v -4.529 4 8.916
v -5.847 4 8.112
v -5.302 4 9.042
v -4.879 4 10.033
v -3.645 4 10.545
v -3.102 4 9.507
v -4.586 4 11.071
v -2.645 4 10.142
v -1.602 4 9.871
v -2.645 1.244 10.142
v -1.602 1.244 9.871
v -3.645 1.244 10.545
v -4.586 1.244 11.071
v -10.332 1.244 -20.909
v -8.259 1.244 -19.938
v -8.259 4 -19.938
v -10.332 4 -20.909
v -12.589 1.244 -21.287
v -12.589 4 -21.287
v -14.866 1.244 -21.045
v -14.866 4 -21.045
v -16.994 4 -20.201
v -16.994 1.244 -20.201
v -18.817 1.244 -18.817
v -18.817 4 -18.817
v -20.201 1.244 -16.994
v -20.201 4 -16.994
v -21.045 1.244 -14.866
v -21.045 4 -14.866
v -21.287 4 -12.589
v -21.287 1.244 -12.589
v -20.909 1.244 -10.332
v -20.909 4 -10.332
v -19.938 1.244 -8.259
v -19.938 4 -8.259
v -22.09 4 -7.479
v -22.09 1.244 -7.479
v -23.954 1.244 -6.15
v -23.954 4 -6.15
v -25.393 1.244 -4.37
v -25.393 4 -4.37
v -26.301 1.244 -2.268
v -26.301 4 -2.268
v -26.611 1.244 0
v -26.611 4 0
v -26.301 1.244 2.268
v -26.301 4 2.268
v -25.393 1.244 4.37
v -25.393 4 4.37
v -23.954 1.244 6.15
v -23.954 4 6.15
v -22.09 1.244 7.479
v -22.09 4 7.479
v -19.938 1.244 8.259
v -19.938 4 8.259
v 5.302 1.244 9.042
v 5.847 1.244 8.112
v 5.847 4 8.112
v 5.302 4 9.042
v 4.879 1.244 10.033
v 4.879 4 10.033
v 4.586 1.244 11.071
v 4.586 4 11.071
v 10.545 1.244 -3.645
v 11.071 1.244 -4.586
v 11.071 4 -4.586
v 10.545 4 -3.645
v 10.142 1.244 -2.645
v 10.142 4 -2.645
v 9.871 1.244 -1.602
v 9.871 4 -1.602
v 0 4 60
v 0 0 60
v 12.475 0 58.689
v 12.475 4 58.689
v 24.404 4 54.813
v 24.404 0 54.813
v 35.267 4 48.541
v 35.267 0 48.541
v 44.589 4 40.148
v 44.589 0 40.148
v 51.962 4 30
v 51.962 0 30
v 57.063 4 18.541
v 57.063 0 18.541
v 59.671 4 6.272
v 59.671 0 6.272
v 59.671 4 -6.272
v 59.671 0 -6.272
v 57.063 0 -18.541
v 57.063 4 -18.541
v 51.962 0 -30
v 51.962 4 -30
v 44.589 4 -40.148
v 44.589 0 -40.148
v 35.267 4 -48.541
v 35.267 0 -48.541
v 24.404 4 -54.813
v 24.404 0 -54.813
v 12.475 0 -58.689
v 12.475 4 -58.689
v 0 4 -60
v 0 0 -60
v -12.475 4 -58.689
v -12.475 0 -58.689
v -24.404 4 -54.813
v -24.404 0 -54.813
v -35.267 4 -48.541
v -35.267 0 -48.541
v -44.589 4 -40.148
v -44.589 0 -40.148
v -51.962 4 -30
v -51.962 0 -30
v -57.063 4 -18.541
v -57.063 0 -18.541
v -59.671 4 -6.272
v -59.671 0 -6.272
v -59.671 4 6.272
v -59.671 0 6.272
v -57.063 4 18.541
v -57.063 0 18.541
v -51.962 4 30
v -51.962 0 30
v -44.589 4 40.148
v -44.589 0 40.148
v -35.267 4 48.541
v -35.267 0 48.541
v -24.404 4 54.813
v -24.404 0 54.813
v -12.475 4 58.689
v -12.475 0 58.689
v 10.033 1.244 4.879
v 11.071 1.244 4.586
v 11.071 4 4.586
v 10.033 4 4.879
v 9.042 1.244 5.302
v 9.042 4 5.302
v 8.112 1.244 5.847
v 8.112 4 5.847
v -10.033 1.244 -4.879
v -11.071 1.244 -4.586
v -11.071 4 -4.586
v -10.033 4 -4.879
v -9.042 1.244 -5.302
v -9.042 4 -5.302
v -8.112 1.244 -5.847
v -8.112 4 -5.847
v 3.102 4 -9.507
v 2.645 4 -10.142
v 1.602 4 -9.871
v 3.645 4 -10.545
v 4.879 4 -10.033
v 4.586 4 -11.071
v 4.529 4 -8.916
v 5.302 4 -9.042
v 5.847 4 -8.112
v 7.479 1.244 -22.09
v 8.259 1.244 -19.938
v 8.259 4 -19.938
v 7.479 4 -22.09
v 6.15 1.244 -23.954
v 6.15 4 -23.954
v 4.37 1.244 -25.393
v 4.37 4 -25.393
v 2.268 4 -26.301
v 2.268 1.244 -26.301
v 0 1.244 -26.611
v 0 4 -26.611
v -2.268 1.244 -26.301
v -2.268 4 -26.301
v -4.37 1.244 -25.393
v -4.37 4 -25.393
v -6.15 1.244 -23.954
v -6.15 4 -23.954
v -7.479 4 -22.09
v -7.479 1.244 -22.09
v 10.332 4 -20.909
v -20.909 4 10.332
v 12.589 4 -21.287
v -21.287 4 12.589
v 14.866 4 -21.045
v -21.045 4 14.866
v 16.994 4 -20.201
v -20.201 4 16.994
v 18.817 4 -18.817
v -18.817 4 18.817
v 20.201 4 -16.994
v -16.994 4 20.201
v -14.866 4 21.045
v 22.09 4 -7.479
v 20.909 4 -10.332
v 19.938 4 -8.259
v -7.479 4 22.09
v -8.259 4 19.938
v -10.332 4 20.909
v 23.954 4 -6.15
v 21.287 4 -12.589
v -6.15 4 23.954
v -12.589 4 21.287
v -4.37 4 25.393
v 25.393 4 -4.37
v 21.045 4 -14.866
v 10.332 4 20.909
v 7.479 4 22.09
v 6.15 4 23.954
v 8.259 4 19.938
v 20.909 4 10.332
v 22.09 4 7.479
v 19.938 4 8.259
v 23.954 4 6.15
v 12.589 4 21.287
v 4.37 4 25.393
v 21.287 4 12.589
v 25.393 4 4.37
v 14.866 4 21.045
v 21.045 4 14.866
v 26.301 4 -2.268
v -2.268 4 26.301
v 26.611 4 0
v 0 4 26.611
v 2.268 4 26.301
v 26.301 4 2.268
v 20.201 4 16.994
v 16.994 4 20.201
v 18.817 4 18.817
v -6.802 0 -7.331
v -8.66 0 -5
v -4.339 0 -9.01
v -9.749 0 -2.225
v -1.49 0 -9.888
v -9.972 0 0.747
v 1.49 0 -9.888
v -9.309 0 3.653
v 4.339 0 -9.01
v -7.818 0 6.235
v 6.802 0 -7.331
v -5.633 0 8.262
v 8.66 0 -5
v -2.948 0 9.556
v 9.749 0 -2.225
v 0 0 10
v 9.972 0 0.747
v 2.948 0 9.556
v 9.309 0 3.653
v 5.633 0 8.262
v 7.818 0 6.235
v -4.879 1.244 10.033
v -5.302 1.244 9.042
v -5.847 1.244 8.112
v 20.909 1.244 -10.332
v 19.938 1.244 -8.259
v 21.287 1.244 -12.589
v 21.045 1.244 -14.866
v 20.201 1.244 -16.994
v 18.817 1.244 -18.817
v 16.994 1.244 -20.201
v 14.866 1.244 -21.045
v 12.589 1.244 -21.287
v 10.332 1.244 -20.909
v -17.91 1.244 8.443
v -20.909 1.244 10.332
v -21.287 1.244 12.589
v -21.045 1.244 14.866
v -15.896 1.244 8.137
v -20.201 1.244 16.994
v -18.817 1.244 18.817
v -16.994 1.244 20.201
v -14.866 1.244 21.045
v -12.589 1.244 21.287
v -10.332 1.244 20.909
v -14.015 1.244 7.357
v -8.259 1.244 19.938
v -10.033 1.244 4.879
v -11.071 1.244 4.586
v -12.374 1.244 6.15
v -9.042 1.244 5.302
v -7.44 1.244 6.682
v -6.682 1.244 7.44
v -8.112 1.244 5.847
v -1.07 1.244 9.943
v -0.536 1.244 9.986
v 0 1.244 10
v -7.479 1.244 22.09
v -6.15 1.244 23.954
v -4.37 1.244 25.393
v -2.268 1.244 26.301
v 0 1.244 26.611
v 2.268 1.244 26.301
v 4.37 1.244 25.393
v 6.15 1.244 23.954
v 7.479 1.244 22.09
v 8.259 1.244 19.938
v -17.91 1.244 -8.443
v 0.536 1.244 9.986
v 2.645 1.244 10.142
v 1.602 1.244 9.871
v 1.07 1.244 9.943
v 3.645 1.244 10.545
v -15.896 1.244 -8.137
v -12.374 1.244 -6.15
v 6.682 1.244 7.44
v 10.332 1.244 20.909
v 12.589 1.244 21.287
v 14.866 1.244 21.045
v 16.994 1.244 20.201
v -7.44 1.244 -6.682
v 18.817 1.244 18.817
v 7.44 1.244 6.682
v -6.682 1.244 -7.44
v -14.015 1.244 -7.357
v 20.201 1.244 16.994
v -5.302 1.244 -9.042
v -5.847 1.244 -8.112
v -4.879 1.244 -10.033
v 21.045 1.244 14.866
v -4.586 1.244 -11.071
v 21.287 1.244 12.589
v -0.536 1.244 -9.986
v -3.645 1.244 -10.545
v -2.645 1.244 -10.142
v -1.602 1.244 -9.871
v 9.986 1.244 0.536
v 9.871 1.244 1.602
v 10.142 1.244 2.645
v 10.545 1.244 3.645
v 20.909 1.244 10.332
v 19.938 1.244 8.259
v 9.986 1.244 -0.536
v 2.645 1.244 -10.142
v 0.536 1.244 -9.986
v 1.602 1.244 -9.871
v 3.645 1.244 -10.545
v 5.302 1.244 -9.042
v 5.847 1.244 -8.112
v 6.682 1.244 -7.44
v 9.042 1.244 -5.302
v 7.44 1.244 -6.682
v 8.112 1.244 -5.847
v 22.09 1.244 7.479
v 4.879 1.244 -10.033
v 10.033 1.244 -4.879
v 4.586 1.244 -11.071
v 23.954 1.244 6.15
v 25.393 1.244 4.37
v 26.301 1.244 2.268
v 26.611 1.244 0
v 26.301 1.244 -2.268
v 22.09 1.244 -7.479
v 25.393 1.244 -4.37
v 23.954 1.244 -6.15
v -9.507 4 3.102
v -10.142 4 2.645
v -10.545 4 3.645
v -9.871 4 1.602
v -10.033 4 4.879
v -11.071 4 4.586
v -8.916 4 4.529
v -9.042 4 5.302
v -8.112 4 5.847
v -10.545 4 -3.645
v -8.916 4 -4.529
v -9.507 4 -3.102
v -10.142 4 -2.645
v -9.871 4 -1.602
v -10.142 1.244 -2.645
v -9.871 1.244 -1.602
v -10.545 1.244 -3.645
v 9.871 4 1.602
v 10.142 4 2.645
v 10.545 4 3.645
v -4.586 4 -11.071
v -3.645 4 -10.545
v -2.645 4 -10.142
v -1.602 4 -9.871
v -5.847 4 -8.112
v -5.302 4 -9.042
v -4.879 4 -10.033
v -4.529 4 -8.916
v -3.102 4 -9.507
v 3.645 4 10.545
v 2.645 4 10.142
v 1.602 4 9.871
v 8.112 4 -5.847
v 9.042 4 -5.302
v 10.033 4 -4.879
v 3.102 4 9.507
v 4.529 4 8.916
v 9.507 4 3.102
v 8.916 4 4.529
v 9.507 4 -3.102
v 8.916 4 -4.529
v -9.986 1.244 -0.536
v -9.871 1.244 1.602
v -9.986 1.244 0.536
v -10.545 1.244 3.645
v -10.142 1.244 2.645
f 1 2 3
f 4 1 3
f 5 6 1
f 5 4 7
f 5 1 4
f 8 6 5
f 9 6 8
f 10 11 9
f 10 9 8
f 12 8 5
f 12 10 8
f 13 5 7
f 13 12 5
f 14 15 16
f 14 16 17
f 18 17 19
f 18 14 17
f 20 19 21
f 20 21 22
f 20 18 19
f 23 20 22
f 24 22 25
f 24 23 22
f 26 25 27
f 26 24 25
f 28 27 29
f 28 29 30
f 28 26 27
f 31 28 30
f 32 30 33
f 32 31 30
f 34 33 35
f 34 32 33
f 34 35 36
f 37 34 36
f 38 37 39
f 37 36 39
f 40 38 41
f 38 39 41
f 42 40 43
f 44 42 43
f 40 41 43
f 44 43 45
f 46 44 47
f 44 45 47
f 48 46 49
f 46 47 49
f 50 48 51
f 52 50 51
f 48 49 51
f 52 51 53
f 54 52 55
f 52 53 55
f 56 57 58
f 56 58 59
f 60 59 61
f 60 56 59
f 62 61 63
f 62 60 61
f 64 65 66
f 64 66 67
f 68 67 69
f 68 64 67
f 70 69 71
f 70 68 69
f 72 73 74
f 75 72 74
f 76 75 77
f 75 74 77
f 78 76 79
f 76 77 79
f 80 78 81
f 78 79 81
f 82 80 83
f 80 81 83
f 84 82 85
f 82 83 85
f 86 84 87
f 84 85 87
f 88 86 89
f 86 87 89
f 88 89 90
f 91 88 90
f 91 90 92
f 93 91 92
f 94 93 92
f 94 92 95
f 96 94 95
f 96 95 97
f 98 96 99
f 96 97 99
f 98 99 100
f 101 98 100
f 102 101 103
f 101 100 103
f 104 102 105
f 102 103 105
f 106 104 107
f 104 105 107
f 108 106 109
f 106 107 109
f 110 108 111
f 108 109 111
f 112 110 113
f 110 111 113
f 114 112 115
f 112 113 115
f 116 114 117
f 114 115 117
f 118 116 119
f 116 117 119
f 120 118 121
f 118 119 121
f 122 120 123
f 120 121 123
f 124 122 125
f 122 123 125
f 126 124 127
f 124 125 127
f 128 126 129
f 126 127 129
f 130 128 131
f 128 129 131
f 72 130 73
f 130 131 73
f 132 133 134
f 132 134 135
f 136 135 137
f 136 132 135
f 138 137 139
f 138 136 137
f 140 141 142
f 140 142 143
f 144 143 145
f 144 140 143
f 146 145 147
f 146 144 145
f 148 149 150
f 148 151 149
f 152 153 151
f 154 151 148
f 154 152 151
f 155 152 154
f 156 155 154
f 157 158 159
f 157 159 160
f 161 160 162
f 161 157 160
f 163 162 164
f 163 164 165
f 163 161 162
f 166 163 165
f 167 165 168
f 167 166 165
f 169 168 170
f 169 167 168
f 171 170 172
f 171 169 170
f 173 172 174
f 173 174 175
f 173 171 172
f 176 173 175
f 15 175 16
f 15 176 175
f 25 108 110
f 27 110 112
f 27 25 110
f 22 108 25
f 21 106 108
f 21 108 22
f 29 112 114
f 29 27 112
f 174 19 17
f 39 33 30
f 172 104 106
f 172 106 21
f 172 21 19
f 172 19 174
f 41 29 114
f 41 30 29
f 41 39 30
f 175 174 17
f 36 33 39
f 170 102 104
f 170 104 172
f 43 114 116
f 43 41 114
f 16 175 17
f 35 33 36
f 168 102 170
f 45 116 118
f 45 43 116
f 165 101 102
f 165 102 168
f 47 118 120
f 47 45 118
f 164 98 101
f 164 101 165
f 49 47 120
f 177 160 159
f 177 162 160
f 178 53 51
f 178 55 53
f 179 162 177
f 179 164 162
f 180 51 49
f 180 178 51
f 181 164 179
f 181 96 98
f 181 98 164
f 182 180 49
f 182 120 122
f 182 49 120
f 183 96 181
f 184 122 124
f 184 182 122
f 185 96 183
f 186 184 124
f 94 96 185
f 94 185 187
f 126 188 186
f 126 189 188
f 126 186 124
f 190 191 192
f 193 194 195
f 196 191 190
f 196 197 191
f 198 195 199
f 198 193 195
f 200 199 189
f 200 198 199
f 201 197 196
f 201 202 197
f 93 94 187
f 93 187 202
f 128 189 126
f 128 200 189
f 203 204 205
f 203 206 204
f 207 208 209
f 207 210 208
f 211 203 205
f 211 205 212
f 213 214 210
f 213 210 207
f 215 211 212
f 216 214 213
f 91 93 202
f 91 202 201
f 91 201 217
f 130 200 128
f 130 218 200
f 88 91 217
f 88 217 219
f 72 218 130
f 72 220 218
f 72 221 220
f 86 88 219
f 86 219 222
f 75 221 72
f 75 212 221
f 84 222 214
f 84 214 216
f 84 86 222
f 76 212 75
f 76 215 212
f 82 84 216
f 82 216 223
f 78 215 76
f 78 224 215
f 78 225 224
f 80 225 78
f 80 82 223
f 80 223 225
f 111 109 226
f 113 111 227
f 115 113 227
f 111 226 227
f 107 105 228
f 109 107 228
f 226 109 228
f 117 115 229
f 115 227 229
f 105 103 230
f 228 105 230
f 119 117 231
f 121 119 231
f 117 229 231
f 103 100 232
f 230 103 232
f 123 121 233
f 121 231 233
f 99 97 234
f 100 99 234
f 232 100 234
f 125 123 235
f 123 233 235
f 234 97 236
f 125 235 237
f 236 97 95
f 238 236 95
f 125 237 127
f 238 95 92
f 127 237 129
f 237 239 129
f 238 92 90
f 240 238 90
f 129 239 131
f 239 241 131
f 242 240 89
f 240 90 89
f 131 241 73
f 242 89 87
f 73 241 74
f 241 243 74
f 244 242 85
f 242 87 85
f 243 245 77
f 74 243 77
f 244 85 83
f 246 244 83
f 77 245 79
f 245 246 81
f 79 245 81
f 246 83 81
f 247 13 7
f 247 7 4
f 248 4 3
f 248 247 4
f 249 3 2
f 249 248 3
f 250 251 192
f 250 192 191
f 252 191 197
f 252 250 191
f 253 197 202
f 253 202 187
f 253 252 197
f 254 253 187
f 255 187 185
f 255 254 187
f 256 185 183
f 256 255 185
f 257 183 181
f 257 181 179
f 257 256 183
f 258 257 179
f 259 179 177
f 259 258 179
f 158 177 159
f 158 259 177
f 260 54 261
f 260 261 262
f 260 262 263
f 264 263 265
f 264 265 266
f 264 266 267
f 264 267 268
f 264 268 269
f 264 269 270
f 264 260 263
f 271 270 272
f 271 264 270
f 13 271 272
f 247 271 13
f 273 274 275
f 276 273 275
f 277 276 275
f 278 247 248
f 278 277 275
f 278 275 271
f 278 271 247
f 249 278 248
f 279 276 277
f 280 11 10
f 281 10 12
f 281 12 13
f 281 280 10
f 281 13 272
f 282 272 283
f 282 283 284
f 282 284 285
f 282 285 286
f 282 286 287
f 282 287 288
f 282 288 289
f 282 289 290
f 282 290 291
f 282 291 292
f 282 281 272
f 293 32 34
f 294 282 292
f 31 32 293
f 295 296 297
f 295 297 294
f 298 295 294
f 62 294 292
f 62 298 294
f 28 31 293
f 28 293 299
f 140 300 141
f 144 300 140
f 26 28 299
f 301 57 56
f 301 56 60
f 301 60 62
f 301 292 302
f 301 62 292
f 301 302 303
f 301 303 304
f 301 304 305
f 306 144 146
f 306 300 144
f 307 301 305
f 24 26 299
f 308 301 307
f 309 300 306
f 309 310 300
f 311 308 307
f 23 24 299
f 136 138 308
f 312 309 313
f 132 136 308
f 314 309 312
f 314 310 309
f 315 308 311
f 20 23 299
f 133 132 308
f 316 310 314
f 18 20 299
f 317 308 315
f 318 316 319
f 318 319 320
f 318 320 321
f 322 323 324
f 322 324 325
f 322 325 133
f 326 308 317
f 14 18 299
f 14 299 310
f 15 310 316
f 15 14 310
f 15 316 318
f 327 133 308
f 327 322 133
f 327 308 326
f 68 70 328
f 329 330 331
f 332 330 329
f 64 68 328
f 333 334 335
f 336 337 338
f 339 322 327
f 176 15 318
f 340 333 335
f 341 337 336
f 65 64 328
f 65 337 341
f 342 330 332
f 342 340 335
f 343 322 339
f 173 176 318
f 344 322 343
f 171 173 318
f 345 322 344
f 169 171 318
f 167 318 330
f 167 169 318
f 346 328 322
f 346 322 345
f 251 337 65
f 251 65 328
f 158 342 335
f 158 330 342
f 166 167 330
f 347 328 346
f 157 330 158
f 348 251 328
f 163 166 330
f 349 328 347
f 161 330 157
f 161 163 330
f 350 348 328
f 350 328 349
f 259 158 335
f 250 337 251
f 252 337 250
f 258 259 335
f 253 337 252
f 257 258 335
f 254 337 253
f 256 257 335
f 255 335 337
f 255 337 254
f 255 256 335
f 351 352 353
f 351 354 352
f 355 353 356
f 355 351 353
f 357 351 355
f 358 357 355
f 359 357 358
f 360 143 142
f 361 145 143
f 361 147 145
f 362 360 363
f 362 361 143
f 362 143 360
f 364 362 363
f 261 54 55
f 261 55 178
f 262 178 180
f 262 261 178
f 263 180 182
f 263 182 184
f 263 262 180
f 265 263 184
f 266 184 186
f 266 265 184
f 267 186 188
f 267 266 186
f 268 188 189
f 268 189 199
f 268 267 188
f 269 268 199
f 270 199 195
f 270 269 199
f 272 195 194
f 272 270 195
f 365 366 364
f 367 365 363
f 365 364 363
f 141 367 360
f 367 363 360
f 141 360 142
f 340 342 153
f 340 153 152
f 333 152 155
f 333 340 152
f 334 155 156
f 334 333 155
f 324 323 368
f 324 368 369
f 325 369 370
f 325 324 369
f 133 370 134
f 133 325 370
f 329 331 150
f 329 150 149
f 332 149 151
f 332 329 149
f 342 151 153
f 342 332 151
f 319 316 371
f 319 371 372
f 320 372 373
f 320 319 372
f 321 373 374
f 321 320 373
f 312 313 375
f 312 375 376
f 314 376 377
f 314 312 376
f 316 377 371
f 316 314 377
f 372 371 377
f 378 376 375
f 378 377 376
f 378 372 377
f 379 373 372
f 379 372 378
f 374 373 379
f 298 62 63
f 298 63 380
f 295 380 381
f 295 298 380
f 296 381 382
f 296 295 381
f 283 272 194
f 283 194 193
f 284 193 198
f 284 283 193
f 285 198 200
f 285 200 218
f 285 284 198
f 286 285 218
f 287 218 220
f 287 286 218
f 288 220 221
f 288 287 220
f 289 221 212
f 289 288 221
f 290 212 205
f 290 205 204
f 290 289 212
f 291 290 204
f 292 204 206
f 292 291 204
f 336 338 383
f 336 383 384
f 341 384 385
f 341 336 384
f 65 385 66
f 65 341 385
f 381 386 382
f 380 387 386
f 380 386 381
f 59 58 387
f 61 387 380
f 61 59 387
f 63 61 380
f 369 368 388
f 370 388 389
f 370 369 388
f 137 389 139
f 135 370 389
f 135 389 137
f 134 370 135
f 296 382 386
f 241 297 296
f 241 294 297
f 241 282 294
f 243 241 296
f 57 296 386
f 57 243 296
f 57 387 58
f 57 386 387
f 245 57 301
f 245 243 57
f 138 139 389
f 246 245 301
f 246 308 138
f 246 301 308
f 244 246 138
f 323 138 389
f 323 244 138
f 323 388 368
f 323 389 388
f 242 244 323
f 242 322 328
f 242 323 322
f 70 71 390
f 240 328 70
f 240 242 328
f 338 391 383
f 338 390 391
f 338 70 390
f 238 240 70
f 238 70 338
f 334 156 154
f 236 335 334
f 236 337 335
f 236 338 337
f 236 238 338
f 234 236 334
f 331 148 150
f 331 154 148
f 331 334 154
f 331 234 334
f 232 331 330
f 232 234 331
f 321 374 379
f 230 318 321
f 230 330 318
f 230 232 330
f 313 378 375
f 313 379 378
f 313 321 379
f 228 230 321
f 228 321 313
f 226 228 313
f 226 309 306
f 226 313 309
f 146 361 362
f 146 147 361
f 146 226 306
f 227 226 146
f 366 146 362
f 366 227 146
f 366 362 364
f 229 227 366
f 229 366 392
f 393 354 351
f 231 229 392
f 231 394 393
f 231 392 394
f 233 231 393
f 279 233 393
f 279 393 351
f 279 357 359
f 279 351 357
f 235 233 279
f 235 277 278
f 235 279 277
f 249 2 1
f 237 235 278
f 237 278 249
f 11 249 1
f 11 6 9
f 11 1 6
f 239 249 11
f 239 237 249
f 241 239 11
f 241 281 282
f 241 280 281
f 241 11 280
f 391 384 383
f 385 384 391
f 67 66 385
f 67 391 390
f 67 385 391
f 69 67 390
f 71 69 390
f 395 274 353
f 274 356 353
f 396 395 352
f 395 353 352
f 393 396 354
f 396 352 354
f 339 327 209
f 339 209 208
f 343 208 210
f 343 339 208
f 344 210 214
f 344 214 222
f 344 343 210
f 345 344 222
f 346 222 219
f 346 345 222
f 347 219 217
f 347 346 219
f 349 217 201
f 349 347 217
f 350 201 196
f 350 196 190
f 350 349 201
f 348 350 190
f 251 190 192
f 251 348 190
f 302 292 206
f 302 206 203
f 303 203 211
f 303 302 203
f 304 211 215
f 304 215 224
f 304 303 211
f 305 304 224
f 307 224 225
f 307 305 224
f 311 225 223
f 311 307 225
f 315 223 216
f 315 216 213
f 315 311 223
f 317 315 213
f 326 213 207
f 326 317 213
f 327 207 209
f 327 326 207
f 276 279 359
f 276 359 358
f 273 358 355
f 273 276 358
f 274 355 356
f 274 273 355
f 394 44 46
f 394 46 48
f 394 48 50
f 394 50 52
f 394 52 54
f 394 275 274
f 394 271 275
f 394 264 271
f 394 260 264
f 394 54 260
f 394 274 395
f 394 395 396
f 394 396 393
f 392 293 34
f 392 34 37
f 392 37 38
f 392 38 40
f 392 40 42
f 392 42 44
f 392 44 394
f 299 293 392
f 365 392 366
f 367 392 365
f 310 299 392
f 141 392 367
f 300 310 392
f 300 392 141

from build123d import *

# Parameters (mm, degrees)
SKETCH1_R           = 60
BOSS_EXTRUDE1_DEPTH = 4
SKETCH2_R           = 10
CUT_EXTRUDE1_DEPTH  = 85.947042326
SKETCH3_R           = 8.446784488
CUT_EXTRUDE2_DEPTH  = 2.755912844
CIRPATTERN1_COUNT   = 8


with BuildPart() as part:
    # Sketch1 → Boss-Extrude1 (new body)
    with BuildSketch(Plane(origin=(0, 0, 0), x_dir=(1, 0, 0), z_dir=(0, 1, 0))):
        Circle(SKETCH1_R)
    extrude(amount=BOSS_EXTRUDE1_DEPTH)

    # Sketch2 → Cut-Extrude1 (cut, through all)
    with BuildSketch(Plane(origin=(0, 0, 0), x_dir=(1, 0, 0), z_dir=(0, 1, 0))):
        Circle(SKETCH2_R)
    extrude(amount=CUT_EXTRUDE1_DEPTH, mode=Mode.SUBTRACT)

    # Sketch3 → Cut-Extrude2 (cut)
    with BuildSketch(Plane(origin=(0, 4, 0), x_dir=(1, 0, 0), z_dir=(0, 1, 0))):
        with Locations((-18.16438515, 0)):
            Circle(SKETCH3_R)
    cut_extrude2 = extrude(amount=-CUT_EXTRUDE2_DEPTH, mode=Mode.SUBTRACT)

    # CirPattern1: Cut-Extrude2 ×8 about axis
    cirpattern1_axis = Axis((0, 0, 0), (0, 1, 0))
    for i in range(1, CIRPATTERN1_COUNT):
        add(cut_extrude2.rotate(cirpattern1_axis, i * 360 / CIRPATTERN1_COUNT), mode=Mode.SUBTRACT)


solid = part.part
